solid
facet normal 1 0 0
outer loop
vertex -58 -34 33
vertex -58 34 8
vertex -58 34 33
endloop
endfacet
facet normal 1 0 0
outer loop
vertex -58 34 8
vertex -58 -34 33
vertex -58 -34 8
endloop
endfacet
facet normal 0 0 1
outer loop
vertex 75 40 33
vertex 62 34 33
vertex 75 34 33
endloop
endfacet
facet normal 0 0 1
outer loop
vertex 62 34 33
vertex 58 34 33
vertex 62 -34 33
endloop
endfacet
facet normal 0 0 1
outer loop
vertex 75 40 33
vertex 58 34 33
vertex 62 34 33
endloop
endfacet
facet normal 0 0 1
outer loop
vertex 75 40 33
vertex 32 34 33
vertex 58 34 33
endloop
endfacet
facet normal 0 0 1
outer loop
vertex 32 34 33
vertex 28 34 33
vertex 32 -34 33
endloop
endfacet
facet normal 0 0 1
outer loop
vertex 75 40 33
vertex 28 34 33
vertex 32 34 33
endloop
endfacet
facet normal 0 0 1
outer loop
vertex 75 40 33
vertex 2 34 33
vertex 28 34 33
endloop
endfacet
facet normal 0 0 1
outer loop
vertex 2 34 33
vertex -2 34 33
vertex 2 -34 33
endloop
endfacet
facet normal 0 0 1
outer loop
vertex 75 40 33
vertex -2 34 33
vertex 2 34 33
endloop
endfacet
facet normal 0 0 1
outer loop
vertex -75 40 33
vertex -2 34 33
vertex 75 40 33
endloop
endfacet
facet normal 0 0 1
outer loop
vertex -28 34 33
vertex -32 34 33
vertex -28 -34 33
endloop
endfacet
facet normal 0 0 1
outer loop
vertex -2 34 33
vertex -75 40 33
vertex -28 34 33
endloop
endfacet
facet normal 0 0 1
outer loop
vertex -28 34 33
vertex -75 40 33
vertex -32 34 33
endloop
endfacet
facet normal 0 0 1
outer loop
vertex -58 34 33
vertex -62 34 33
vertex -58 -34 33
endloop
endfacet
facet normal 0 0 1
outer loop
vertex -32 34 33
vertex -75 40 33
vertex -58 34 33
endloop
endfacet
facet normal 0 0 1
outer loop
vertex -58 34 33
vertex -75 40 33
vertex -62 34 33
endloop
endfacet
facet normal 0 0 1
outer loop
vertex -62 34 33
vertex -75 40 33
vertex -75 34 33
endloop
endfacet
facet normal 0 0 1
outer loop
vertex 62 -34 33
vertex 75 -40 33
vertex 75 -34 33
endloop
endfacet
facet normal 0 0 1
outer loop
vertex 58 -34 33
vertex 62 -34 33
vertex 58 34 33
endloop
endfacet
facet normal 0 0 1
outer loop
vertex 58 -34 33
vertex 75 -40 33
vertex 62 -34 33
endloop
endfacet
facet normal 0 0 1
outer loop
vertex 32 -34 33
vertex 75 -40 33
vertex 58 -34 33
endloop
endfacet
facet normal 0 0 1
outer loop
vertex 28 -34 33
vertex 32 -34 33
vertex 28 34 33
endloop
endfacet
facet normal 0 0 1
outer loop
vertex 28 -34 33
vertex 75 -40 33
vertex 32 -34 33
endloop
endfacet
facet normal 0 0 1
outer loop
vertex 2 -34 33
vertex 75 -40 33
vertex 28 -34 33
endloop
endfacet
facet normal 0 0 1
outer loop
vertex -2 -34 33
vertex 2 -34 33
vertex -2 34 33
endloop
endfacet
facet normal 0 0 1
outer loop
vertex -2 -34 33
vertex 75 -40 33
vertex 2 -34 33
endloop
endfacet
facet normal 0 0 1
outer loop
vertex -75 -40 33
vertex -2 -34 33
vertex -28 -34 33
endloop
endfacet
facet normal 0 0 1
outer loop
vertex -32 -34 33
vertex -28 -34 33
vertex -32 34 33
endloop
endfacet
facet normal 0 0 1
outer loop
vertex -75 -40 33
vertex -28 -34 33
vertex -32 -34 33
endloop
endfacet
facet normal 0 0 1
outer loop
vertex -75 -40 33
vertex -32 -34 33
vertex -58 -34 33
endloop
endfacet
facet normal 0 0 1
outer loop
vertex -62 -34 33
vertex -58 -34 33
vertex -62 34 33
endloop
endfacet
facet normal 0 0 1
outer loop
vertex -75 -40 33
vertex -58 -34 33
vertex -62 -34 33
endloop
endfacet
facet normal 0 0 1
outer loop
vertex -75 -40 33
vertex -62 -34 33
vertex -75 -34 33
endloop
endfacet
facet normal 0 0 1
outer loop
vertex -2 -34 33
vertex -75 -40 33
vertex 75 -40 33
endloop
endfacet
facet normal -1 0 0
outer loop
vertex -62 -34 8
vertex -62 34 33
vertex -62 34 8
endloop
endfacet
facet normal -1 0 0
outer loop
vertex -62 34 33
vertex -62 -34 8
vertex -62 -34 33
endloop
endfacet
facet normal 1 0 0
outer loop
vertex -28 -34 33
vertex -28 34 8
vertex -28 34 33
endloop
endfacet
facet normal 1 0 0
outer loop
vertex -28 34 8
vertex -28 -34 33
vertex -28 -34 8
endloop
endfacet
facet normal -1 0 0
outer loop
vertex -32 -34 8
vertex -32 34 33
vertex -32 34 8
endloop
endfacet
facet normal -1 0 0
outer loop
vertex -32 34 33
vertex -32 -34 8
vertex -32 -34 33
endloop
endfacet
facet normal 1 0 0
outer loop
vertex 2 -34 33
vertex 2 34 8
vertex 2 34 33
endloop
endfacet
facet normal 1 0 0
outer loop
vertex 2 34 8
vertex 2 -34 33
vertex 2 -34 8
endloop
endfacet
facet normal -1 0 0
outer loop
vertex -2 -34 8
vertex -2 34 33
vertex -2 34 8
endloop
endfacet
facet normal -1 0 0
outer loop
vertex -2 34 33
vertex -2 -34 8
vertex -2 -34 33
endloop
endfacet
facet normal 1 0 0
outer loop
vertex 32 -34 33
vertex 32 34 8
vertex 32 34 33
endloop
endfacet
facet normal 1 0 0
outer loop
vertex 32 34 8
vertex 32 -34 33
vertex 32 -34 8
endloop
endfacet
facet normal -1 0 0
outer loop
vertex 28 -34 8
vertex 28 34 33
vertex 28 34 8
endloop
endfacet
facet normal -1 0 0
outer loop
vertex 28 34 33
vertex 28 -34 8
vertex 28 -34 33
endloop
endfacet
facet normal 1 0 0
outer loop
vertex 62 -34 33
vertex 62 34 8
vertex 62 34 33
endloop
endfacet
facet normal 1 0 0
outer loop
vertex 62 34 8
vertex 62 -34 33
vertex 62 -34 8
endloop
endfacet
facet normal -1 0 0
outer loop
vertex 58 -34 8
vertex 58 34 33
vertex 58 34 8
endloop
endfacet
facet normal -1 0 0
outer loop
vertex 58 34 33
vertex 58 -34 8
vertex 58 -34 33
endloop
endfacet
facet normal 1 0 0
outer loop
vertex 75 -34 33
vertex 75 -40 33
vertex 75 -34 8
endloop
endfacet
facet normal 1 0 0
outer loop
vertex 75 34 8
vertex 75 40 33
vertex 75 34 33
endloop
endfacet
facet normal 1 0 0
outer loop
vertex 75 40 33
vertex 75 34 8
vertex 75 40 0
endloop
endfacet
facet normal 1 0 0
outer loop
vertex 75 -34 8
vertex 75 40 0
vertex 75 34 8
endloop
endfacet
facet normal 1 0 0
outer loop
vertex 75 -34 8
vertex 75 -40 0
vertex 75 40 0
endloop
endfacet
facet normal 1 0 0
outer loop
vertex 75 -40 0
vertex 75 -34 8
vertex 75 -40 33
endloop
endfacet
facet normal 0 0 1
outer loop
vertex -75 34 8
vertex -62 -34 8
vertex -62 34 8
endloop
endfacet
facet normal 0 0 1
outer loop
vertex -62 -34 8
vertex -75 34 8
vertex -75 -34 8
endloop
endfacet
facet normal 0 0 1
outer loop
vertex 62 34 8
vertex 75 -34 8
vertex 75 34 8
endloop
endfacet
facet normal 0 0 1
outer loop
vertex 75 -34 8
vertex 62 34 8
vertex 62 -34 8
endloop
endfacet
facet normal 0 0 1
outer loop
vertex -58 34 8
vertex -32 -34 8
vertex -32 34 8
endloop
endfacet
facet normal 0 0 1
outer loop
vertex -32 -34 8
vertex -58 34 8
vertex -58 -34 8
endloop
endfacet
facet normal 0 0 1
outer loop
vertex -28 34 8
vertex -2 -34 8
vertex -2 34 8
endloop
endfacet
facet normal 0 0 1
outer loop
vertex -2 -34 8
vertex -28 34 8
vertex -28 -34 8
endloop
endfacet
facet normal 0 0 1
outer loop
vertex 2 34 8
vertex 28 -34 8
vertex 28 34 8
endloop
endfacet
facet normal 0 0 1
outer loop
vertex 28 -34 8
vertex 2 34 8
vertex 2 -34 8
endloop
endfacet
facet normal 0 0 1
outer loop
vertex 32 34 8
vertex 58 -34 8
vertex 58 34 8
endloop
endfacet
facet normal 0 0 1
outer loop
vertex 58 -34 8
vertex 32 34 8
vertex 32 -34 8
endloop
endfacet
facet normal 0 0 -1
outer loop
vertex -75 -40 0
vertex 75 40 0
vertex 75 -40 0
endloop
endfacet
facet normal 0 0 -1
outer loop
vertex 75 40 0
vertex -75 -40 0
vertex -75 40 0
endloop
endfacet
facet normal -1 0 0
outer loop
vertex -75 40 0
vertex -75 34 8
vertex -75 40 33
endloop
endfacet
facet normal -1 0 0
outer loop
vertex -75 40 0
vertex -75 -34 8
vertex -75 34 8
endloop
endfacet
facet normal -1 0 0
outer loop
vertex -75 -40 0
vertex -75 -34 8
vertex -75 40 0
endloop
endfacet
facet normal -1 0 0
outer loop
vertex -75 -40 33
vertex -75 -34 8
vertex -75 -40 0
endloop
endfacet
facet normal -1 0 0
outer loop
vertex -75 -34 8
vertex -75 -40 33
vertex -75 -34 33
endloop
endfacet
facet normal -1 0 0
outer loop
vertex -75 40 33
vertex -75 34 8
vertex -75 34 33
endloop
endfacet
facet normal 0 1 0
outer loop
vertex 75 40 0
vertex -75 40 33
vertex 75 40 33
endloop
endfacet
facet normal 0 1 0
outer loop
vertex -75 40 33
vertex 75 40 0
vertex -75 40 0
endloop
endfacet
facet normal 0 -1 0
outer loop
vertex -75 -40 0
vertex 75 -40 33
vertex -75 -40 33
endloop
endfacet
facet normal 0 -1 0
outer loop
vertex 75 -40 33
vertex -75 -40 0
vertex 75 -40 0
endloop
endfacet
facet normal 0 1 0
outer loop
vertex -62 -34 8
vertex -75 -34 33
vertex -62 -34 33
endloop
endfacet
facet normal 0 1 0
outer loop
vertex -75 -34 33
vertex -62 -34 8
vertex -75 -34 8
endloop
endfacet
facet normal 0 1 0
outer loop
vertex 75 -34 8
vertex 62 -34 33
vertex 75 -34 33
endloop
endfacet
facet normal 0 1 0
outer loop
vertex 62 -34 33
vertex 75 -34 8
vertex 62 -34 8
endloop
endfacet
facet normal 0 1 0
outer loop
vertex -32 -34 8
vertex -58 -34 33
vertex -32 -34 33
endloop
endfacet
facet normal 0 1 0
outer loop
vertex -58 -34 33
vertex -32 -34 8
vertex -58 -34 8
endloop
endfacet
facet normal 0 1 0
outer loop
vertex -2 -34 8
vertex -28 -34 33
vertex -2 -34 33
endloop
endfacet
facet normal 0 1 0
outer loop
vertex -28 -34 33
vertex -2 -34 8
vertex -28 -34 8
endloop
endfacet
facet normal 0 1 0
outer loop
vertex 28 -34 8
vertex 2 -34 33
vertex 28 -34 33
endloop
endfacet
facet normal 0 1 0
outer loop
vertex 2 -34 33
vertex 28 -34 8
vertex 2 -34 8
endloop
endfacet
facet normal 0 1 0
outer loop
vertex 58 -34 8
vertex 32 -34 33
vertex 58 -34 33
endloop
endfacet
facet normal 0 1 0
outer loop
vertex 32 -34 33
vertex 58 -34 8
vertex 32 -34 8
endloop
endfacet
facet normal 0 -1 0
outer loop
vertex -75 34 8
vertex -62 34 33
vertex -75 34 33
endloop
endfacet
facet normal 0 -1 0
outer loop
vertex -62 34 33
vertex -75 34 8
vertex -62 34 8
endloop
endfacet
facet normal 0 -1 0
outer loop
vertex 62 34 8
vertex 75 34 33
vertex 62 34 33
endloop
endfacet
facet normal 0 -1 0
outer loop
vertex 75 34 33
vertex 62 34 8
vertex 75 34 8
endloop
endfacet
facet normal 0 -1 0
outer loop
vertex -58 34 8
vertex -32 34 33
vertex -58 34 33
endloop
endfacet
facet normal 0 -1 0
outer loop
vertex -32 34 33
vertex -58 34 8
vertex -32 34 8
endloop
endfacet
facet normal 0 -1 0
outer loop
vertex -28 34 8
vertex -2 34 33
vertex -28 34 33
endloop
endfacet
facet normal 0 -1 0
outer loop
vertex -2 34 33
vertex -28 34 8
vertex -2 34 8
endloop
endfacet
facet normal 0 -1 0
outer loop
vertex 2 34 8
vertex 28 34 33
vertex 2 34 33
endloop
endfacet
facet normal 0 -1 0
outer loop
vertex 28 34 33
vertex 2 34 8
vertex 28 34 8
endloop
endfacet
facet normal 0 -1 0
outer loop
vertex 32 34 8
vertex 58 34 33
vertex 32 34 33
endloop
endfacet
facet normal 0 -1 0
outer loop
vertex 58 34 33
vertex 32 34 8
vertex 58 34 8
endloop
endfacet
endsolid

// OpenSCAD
$fn = 32;

// ----------------------------------------------------------------------
// Rib frame 150 x 80 x 33
// 5 ribs at 30 mm pitch
// ----------------------------------------------------------------------

// --- parameters (mm) ---
frame = [150, 80, 8];  // base plate size (x, y, z)
rail_w = 6;            // side rail width
ribs = 5;              // number of ribs
rib_t = 4;             // rib thickness
rib_h = 25;            // rib height above the base plate
pitch = 30;            // pitch between rib centres

// --- derived feature positions (mm) ---
span = (ribs - 1) * pitch;          // = 120   distance between the outer ribs
origin_x = -span / 2;               // = -60   X of the first rib
rib_len = frame[1] - 2 * rail_w + 2;  // = 70   rib length, 1 mm into each rail
feature_centers = [
  [origin_x + 0 * pitch, 0],
  [origin_x + 1 * pitch, 0],
  [origin_x + 2 * pitch, 0],
  [origin_x + 3 * pitch, 0],
  [origin_x + 4 * pitch, 0]
];   // rib centre line, drives the rib loop

// base plate, two side rails, then the ribs read straight off feature_centers
union() {
  translate([-frame[0] / 2, -frame[1] / 2, 0]) cube(frame);
  translate([-frame[0] / 2, -frame[1] / 2, 0]) cube([frame[0], rail_w, frame[2] + rib_h]);
  translate([-frame[0] / 2, frame[1] / 2 - rail_w, 0]) cube([frame[0], rail_w, frame[2] + rib_h]);
  for (centre = feature_centers)
    translate([centre[0] - rib_t / 2, centre[1] - rib_len / 2, frame[2] - 1])
      cube([rib_t, rib_len, rib_h + 1]);
}
